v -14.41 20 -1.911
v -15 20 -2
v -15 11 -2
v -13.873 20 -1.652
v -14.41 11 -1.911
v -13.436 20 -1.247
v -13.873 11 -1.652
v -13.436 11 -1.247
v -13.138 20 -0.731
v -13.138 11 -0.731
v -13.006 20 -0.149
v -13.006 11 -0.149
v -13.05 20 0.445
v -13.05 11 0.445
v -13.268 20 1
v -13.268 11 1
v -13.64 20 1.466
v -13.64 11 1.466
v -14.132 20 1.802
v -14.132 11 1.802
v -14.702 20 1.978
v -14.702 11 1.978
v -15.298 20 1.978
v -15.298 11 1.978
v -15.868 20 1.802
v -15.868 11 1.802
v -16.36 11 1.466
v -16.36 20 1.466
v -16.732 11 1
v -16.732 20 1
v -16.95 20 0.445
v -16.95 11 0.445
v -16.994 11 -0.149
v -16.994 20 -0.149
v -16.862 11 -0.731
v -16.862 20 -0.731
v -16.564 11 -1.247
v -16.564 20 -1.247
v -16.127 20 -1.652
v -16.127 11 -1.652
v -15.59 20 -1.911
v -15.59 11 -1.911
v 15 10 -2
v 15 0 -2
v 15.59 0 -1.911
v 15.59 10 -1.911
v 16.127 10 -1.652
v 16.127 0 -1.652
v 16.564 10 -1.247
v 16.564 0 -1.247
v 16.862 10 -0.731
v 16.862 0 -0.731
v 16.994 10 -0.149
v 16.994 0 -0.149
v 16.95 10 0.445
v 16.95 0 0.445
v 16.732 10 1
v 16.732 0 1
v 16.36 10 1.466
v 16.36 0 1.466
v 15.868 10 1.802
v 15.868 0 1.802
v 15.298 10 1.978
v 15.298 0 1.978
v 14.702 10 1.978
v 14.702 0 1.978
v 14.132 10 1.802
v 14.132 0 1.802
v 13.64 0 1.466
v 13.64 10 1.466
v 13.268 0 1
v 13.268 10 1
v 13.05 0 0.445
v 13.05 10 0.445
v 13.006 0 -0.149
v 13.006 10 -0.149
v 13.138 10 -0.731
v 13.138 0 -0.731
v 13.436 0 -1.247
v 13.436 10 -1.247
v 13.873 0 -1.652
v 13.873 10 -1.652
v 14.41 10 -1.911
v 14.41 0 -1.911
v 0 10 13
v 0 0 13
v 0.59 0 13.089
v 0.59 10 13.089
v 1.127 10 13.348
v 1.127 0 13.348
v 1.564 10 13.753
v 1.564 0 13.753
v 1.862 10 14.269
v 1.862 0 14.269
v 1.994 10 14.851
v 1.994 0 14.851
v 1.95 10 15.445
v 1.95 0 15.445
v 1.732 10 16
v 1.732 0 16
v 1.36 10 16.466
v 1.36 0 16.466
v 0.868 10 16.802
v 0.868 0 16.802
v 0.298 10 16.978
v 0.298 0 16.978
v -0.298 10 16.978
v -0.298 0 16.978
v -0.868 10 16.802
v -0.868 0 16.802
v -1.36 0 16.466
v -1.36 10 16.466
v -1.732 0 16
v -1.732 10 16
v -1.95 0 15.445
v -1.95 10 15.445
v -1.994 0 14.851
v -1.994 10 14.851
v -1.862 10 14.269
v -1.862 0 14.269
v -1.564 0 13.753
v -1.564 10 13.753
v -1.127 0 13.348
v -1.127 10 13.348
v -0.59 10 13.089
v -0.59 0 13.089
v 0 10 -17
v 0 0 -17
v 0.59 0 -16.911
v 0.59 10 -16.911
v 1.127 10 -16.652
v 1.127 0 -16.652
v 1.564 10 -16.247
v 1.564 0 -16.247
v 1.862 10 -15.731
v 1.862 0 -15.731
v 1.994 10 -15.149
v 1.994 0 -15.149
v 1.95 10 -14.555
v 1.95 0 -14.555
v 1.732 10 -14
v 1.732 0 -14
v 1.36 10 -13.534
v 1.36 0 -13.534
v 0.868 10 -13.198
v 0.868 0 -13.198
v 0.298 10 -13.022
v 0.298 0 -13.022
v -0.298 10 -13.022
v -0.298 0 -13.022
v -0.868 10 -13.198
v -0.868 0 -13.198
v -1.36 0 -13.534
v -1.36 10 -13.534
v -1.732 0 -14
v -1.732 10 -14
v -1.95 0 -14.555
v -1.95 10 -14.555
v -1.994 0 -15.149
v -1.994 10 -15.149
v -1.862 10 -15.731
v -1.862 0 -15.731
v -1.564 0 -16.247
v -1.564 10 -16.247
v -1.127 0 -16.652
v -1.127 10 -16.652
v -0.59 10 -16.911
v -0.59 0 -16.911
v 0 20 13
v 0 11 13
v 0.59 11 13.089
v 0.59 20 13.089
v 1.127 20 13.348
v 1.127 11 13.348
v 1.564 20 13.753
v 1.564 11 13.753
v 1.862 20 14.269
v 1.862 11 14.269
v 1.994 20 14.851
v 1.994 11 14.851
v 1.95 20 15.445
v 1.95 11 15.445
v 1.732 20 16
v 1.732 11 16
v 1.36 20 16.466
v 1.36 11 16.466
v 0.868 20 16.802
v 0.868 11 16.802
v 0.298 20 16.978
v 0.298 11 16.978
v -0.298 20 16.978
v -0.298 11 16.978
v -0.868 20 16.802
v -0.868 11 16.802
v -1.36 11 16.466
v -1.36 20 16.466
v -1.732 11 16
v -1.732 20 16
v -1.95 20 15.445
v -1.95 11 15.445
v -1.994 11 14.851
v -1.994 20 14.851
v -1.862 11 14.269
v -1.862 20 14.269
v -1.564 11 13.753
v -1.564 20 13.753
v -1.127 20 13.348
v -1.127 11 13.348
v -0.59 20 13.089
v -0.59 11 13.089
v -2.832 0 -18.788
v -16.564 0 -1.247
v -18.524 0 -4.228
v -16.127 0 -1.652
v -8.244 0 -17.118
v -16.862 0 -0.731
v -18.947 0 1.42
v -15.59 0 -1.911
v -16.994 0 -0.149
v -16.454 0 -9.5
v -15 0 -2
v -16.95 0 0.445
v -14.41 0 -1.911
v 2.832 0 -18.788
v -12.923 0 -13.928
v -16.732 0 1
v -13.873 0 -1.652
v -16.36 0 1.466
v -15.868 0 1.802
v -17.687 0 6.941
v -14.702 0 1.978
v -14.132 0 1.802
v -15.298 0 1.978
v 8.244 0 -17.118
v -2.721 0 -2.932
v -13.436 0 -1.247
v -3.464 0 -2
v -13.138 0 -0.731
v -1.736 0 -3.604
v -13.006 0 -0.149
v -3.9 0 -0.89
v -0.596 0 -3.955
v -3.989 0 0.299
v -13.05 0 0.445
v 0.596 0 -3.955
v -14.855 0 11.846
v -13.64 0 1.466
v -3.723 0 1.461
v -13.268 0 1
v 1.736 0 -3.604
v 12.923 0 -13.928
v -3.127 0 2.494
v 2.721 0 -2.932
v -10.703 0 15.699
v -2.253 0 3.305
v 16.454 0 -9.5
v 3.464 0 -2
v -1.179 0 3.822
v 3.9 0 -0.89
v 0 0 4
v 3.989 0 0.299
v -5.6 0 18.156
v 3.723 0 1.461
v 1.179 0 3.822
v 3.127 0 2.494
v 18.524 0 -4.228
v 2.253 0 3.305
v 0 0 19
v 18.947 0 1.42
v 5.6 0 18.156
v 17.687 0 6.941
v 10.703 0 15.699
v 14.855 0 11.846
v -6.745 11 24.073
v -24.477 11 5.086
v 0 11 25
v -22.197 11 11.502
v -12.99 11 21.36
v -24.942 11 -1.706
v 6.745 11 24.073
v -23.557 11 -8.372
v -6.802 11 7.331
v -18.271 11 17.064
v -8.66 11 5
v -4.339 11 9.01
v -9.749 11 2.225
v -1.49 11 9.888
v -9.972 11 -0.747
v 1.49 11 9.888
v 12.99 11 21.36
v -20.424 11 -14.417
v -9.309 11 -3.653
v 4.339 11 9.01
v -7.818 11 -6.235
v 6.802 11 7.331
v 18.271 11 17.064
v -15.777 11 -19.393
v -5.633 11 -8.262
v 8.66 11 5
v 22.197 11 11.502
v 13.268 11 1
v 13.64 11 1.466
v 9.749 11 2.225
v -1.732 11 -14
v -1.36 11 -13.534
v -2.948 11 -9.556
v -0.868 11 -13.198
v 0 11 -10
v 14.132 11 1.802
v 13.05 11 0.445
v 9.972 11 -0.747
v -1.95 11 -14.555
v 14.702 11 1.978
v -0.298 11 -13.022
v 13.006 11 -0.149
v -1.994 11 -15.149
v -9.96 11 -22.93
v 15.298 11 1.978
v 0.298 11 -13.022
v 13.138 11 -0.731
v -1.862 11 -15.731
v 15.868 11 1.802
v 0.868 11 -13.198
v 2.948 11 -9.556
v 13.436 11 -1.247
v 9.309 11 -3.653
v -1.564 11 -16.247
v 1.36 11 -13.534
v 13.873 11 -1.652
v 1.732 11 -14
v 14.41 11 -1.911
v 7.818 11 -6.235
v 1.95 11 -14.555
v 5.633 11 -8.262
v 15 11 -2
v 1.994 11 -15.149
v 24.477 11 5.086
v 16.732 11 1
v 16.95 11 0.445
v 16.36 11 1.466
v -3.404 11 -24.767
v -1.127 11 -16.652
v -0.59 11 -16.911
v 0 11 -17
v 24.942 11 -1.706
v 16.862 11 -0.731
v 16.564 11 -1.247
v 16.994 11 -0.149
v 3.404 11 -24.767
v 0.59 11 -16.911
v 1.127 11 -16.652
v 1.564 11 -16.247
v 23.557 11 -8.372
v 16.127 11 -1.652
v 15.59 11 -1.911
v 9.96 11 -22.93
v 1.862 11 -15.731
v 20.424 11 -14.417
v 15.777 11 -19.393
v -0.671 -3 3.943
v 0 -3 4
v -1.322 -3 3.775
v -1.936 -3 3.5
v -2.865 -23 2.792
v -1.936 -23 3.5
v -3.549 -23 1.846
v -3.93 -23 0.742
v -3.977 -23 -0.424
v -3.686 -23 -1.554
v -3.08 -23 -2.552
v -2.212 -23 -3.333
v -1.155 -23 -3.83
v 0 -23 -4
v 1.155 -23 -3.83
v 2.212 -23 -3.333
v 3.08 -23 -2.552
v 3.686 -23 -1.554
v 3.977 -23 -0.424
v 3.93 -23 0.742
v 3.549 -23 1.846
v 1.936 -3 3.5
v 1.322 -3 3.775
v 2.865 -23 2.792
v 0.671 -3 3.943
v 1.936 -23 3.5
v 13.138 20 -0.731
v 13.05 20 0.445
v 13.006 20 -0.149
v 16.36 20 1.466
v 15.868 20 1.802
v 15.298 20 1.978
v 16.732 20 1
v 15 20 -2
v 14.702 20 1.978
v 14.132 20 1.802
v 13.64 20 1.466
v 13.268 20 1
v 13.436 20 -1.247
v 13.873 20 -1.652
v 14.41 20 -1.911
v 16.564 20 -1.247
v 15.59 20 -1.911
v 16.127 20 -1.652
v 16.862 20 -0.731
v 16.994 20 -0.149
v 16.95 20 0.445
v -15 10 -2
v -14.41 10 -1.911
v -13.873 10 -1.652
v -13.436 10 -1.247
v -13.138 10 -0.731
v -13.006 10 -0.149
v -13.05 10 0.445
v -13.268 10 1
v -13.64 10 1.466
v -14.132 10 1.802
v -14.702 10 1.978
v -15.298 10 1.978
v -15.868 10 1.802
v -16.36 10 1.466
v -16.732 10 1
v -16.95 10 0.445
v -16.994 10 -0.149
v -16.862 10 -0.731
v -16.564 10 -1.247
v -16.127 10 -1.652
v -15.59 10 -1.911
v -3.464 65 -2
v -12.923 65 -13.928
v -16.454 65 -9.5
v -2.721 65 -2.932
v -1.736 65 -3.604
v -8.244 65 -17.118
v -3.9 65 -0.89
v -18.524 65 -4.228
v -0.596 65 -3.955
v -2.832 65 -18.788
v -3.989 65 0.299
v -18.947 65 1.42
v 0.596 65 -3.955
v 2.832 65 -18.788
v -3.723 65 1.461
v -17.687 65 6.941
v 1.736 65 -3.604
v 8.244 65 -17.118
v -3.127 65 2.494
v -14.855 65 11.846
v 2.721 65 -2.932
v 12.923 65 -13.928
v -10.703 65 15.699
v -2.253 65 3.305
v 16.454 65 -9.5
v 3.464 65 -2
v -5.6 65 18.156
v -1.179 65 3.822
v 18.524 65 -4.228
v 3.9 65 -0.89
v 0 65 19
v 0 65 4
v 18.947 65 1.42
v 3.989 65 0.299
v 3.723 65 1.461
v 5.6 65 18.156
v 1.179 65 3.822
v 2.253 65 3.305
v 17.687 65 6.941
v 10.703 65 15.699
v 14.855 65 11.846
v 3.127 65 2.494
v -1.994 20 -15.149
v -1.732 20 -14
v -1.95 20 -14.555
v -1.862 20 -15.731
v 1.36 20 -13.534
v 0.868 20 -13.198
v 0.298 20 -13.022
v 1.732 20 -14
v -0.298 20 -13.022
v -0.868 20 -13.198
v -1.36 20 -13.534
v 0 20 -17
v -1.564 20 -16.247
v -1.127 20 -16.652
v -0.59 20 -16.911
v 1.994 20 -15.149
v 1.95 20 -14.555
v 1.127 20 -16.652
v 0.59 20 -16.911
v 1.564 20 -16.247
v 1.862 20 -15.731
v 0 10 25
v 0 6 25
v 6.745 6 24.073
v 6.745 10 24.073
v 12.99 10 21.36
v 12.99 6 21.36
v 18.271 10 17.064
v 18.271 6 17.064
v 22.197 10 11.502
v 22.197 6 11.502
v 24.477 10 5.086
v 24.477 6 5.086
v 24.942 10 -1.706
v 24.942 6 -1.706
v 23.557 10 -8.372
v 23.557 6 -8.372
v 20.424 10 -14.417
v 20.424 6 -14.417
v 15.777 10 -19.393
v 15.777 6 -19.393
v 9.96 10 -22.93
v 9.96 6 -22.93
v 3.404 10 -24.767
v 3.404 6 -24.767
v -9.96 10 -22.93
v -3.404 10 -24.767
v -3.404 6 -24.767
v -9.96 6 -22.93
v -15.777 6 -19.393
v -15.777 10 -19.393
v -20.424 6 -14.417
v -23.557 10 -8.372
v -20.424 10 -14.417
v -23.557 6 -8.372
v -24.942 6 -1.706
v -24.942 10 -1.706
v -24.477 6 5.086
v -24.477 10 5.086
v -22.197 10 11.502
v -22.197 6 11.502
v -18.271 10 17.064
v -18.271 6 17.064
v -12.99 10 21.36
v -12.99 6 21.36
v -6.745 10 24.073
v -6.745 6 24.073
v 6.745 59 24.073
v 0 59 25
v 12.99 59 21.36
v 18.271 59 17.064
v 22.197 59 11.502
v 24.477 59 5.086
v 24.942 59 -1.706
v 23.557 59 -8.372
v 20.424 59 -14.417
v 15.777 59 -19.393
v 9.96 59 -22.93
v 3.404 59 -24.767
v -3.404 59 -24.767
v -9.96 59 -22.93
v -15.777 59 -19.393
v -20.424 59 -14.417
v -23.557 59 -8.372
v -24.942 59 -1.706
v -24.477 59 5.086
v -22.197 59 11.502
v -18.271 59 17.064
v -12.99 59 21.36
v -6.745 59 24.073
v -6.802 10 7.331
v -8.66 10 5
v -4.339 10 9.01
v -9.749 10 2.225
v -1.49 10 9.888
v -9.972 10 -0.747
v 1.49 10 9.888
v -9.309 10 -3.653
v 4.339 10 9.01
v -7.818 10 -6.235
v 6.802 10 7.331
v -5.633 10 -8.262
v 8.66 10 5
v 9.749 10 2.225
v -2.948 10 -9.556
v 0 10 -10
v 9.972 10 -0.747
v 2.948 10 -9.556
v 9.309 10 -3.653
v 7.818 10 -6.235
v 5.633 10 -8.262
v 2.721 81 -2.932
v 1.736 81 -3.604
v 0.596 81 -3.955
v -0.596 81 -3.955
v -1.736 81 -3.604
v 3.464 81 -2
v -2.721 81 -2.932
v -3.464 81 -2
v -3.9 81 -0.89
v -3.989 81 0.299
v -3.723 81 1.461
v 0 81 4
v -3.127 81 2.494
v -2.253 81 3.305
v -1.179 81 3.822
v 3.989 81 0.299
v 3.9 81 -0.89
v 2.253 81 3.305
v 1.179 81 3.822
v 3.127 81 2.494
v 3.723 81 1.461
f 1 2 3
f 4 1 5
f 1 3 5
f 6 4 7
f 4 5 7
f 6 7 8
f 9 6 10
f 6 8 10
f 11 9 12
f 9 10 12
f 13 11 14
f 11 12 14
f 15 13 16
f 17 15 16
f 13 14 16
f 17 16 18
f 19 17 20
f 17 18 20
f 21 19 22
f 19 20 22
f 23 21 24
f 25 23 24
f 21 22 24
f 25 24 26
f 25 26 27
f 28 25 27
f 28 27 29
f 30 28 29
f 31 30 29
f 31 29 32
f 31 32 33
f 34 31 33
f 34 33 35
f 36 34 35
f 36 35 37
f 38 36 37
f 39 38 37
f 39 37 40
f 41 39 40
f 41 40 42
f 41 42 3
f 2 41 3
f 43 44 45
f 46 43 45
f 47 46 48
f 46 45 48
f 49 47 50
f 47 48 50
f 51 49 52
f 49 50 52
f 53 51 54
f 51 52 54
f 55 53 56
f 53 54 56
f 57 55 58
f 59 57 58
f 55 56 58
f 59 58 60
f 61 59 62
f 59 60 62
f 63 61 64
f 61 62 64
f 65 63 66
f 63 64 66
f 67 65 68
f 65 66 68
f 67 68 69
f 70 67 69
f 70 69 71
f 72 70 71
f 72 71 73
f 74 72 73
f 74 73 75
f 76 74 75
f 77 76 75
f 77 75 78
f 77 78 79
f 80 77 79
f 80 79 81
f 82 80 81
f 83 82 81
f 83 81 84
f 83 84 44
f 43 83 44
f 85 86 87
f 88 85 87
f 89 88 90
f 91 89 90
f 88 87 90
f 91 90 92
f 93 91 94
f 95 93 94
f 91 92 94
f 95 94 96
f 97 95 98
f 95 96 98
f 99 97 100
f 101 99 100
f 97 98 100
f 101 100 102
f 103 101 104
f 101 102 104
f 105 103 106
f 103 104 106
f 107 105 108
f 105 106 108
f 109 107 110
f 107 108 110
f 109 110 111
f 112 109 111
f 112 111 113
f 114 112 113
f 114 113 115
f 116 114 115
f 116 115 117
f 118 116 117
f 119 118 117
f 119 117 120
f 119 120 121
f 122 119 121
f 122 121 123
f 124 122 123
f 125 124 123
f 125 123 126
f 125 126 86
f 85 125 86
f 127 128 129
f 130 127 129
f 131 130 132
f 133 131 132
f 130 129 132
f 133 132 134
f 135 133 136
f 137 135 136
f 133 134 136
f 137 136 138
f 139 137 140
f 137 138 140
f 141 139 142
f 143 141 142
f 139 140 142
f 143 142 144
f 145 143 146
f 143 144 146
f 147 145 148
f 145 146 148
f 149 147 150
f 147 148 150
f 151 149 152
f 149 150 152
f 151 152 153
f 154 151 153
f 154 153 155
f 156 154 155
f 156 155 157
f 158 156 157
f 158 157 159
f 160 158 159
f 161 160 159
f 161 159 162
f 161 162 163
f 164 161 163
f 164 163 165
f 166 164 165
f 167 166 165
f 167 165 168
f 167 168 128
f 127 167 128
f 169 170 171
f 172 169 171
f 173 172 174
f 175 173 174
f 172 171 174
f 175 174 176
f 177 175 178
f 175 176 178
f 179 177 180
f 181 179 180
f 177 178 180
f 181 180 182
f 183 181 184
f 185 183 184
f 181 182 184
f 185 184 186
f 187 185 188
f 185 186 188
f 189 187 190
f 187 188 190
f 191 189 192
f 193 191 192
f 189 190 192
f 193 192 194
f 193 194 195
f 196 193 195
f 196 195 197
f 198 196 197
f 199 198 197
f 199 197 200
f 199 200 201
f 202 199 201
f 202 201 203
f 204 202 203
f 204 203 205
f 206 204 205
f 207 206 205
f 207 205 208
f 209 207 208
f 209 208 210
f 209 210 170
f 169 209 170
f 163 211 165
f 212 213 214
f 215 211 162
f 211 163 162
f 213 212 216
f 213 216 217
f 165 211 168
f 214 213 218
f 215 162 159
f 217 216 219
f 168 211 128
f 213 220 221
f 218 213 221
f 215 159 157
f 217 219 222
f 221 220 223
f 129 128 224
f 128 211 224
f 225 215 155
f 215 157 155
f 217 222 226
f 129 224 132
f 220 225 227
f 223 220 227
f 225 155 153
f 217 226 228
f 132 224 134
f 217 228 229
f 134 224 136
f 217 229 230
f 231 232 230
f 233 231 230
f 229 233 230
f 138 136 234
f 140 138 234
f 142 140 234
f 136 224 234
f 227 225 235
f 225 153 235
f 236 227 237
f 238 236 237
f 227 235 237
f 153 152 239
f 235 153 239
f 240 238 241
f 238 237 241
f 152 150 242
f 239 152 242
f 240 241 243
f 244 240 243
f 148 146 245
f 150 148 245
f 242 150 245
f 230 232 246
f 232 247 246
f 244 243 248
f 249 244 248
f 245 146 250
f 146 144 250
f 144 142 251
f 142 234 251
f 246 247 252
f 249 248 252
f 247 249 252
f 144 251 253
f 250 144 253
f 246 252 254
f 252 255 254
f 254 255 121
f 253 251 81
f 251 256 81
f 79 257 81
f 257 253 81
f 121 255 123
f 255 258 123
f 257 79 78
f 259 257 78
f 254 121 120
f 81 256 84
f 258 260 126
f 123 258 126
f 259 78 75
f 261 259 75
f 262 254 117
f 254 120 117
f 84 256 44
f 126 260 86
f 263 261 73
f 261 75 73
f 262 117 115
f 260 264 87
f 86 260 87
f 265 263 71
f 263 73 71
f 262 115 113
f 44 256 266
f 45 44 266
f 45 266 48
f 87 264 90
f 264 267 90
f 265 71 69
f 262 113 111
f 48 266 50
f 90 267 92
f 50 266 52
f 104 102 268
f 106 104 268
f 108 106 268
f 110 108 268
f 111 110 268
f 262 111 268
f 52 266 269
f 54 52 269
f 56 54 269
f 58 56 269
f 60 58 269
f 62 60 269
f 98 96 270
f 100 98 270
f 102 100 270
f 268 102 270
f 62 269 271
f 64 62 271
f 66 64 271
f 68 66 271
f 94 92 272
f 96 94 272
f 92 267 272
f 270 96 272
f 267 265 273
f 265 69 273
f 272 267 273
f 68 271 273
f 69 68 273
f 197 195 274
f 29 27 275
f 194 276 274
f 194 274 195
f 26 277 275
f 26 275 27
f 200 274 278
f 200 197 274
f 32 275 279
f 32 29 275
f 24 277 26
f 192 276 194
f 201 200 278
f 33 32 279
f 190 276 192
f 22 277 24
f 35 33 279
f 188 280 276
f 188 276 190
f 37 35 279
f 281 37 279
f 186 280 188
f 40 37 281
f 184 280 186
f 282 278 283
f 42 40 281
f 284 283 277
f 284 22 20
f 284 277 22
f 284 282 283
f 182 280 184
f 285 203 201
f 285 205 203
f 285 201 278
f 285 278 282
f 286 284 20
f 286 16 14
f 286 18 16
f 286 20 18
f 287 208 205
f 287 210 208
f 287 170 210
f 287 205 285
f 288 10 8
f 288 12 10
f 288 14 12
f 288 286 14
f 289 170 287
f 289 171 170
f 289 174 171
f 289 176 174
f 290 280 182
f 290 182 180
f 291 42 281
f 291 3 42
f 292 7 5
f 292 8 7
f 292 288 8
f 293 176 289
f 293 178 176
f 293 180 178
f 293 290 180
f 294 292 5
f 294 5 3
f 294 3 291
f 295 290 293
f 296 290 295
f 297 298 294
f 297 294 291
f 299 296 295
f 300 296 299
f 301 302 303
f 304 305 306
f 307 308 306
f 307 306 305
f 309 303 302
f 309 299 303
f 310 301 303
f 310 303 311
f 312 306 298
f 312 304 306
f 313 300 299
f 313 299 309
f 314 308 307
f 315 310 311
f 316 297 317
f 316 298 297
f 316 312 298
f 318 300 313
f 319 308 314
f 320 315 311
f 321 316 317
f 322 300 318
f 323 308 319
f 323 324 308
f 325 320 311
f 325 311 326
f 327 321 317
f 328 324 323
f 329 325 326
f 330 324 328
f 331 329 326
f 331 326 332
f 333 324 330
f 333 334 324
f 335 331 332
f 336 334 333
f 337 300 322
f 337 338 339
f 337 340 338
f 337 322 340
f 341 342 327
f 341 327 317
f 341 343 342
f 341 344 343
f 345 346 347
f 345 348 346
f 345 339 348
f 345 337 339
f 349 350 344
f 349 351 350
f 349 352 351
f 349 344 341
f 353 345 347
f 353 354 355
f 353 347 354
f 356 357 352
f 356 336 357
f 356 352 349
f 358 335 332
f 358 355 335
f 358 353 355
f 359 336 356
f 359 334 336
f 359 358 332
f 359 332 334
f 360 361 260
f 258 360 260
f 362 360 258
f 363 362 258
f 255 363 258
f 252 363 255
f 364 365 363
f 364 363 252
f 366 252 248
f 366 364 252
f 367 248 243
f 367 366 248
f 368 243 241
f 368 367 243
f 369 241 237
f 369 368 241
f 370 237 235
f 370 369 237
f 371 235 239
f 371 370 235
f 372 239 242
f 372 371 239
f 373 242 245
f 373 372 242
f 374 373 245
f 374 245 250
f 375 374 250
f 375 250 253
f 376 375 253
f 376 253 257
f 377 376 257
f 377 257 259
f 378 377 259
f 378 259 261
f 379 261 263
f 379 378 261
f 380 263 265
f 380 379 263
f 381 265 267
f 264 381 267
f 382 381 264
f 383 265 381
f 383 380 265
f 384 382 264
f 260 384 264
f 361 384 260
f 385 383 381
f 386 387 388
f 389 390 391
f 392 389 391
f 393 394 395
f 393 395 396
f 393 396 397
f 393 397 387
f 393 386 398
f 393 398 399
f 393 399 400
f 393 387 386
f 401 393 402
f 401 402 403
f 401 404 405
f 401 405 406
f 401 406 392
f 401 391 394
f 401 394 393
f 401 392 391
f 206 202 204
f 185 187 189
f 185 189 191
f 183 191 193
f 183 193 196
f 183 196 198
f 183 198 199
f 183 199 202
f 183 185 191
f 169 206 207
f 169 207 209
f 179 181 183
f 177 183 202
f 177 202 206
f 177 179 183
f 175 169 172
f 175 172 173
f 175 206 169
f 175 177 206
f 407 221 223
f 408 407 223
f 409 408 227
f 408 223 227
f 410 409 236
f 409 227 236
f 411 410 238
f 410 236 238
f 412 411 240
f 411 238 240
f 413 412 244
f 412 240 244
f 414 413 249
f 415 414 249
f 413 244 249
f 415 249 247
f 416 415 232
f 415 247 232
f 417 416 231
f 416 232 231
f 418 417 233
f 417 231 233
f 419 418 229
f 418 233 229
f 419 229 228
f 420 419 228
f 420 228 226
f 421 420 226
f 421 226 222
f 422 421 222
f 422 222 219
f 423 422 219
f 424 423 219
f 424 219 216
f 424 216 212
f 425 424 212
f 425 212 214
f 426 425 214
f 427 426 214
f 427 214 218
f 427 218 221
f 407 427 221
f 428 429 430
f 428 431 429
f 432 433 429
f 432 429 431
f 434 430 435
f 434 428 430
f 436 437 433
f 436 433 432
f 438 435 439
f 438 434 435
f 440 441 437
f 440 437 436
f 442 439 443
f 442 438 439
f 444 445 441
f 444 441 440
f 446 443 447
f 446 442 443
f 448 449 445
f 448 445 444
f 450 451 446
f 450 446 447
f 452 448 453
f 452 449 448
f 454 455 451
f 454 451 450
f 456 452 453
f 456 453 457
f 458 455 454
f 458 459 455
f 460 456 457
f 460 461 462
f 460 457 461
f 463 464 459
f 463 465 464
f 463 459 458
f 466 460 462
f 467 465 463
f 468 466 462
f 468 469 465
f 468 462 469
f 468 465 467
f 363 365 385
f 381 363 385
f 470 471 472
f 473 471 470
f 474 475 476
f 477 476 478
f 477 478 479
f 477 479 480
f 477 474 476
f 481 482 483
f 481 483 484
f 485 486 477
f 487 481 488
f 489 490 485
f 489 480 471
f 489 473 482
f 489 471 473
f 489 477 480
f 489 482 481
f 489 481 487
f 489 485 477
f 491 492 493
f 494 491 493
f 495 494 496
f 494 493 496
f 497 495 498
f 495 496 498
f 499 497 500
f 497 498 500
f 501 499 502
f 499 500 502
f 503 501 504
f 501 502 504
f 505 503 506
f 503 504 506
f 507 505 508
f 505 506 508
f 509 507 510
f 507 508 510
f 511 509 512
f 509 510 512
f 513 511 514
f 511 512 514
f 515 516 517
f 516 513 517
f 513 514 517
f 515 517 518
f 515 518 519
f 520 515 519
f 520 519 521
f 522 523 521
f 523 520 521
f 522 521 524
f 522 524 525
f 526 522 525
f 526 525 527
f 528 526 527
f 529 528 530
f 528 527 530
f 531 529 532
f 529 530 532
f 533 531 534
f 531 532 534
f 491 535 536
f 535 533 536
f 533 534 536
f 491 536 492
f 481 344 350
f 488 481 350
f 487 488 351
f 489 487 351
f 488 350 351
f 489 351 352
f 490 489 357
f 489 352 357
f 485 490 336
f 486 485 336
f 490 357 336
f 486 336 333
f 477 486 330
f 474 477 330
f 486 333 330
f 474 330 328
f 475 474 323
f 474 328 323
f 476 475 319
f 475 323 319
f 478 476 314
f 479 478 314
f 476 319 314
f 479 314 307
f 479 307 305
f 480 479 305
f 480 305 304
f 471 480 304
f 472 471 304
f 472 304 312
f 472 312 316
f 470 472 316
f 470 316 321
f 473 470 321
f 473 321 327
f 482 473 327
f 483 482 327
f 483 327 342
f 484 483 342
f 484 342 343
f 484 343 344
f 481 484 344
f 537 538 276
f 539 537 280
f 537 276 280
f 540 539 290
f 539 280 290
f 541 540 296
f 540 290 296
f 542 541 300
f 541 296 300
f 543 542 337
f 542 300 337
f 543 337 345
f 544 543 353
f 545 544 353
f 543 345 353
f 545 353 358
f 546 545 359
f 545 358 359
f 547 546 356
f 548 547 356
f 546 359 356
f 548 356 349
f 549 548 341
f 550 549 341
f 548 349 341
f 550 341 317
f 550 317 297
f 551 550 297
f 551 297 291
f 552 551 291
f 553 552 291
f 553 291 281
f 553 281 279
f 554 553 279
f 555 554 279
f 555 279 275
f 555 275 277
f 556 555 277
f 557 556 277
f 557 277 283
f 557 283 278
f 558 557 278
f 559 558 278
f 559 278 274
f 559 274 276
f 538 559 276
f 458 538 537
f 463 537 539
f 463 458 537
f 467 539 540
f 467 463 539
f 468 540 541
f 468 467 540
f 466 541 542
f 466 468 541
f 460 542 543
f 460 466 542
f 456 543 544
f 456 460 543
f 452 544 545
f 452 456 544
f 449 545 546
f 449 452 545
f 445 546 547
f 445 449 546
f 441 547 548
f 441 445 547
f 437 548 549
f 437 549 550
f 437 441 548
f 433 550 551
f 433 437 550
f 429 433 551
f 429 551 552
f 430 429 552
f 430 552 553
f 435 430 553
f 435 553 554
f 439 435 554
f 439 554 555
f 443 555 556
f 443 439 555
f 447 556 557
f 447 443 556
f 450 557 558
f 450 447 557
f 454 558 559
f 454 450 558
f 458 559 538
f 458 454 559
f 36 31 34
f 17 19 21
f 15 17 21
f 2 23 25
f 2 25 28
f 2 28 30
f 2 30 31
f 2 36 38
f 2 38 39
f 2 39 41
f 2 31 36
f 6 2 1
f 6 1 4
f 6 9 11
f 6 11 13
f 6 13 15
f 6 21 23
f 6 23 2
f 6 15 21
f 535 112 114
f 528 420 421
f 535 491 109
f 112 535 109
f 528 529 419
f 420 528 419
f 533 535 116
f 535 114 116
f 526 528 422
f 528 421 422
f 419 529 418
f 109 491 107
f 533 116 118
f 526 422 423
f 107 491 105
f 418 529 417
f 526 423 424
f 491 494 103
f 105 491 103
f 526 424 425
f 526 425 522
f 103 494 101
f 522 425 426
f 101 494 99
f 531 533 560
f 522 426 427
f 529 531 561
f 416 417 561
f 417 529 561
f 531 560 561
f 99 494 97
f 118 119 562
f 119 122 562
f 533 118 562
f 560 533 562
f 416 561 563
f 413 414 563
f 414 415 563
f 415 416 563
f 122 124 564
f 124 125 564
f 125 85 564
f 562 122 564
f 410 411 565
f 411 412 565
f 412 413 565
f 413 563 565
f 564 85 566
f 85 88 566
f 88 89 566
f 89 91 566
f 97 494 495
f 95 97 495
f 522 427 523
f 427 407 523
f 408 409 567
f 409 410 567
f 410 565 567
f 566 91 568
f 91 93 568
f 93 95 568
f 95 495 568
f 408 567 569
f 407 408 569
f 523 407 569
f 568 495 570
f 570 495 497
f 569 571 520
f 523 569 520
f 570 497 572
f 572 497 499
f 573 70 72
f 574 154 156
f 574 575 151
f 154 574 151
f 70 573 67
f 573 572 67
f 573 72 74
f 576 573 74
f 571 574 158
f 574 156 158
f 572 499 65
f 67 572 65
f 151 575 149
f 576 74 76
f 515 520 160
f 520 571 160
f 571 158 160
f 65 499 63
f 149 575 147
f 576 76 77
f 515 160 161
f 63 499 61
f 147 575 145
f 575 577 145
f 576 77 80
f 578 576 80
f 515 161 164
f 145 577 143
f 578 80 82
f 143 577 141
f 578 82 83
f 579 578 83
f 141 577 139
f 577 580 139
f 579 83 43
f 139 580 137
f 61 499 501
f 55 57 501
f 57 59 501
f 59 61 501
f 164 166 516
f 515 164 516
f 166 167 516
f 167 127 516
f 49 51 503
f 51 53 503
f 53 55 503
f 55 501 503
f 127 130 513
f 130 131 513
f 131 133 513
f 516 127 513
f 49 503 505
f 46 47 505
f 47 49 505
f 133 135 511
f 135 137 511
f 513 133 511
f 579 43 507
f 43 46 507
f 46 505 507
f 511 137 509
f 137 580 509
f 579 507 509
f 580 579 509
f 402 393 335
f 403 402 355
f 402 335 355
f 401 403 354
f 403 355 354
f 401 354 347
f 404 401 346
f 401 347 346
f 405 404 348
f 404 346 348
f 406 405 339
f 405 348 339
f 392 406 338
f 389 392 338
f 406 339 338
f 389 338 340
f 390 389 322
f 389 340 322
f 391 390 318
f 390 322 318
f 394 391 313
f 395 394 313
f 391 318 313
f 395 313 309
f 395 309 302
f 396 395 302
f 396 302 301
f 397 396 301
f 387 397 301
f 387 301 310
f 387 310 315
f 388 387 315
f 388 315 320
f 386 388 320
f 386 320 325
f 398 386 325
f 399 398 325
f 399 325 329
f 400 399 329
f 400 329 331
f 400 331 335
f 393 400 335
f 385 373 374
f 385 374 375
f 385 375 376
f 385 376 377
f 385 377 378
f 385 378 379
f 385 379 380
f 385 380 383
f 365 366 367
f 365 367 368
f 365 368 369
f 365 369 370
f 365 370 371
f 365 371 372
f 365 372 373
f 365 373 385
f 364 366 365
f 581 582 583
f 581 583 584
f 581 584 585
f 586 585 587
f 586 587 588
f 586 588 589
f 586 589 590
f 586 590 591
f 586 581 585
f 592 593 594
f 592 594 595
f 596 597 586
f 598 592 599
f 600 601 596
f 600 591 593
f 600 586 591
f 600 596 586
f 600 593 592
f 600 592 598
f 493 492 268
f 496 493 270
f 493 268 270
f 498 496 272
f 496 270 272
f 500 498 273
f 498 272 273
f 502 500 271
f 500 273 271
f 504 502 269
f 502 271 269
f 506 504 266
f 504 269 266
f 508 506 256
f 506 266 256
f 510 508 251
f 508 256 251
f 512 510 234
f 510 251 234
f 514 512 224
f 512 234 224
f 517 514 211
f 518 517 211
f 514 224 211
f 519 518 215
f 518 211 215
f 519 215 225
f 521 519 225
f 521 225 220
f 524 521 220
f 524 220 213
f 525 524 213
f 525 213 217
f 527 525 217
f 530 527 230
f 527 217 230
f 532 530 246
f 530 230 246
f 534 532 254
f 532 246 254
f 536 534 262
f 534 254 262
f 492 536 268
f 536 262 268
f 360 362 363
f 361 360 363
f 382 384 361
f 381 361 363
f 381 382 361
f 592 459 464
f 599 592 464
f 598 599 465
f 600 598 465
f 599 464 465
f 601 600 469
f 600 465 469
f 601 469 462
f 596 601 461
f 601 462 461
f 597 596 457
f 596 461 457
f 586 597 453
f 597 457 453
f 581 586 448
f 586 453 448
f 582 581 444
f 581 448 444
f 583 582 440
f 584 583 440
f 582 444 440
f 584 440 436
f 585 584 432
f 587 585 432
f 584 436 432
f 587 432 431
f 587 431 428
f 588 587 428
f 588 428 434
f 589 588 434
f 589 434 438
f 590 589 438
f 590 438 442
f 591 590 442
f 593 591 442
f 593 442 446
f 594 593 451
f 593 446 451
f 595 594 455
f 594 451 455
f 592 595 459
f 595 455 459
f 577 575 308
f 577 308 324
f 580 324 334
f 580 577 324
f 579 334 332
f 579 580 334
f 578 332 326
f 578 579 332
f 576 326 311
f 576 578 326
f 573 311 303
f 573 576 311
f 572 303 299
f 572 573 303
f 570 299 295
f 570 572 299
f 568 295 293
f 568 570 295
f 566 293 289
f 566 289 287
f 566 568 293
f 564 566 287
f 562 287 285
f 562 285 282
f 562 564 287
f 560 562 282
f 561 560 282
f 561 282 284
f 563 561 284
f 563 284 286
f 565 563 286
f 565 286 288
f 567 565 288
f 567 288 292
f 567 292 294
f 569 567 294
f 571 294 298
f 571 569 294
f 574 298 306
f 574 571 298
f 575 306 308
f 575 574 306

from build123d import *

# Parameters (mm, degrees)
SKETCH1_R           = 25
BOSS_EXTRUDE1_DEPTH = 65
CHAMFER1_SIZE       = 6
SKETCH2_R           = 4
BOSS_EXTRUDE2_DEPTH = 16
BOSS_EXTRUDE3_START = 23
SKETCH4_R           = 4
BOSS_EXTRUDE3_DEPTH = 23
CUT_EXTRUDE4_DEPTH  = 20
SKETCH6_R           = 2
CUT_EXTRUDE5_DEPTH  = 20
CUT_EXTRUDE6_START  = -10
SKETCH7_R           = 25
SKETCH7_R_2         = 10
CUT_EXTRUDE6_DEPTH  = 1


with BuildPart() as part:
    # Sketch1 → Boss-Extrude1 (new body)
    with BuildSketch(Plane(origin=(0, 0, 0), x_dir=(1, 0, 0), z_dir=(0, 1, 0))):
        with Locations(Location((0, 0, 0), (0, 0, 270))):
            Circle(SKETCH1_R)
    extrude(amount=BOSS_EXTRUDE1_DEPTH)

    # Chamfer1
    chamfer1_edges = [part.edges().sort_by_distance(p)[0] for p in [
        (0, 0, -25),
        (0, 65, -25),
    ]]
    chamfer(chamfer1_edges, length=CHAMFER1_SIZE)

    # Sketch2 → Boss-Extrude2 (add)
    with BuildSketch(Plane(origin=(0, 65, 0), x_dir=(1, 0, 0), z_dir=(0, 1, 0))):
        with Locations(Location((0, 0, 0), (0, 0, 270))):
            Circle(SKETCH2_R)
    extrude(amount=BOSS_EXTRUDE2_DEPTH)

    # Sketch4 → Boss-Extrude3 (add)
    with BuildSketch(Plane.XZ.offset(BOSS_EXTRUDE3_START)):
        with Locations(Location((0, 0, 0), (0, 0, 90))):
            Circle(SKETCH4_R)
    extrude(amount=-BOSS_EXTRUDE3_DEPTH)

    # Sketch5 → Cut-Extrude4 (cut)
    with BuildSketch(Plane.XZ.offset(23)):
        with BuildLine():
            Line((-1.936491673, 3.5), (1.936491673, 3.5))
            ThreePointArc((1.936491673, 3.5), (0, 4), (-1.936491673, 3.5))
        make_face()
    extrude(amount=-CUT_EXTRUDE4_DEPTH, mode=Mode.SUBTRACT)

    # Sketch6 → Cut-Extrude5 (cut)
    with BuildSketch(Plane(origin=(0, 0, 0), x_dir=(-1, 0, 0), z_dir=(0, -1, 0))):
        with Locations(Location((15, 0, 0), (0, 0, 90))):
            Circle(SKETCH6_R)
        with Locations(Location((0, -15, 0), (0, 0, 90))):
            Circle(SKETCH6_R)
        with Locations(Location((-15, 0, 0), (0, 0, 90))):
            Circle(SKETCH6_R)
        with Locations(Location((0, 15, 0), (0, 0, 90))):
            Circle(SKETCH6_R)
    extrude(amount=-CUT_EXTRUDE5_DEPTH, mode=Mode.SUBTRACT)

    # Sketch7 → Cut-Extrude6 (cut)
    with BuildSketch(Plane.XZ.offset(CUT_EXTRUDE6_START)):
        with Locations(Location((0, 0, 0), (0, 0, 270))):
            Circle(SKETCH7_R)
        with Locations(Location((0, 0, 0), (0, 0, 270))):
            Circle(SKETCH7_R_2, mode=Mode.SUBTRACT)
    extrude(amount=-CUT_EXTRUDE6_DEPTH, mode=Mode.SUBTRACT)


solid = part.part
